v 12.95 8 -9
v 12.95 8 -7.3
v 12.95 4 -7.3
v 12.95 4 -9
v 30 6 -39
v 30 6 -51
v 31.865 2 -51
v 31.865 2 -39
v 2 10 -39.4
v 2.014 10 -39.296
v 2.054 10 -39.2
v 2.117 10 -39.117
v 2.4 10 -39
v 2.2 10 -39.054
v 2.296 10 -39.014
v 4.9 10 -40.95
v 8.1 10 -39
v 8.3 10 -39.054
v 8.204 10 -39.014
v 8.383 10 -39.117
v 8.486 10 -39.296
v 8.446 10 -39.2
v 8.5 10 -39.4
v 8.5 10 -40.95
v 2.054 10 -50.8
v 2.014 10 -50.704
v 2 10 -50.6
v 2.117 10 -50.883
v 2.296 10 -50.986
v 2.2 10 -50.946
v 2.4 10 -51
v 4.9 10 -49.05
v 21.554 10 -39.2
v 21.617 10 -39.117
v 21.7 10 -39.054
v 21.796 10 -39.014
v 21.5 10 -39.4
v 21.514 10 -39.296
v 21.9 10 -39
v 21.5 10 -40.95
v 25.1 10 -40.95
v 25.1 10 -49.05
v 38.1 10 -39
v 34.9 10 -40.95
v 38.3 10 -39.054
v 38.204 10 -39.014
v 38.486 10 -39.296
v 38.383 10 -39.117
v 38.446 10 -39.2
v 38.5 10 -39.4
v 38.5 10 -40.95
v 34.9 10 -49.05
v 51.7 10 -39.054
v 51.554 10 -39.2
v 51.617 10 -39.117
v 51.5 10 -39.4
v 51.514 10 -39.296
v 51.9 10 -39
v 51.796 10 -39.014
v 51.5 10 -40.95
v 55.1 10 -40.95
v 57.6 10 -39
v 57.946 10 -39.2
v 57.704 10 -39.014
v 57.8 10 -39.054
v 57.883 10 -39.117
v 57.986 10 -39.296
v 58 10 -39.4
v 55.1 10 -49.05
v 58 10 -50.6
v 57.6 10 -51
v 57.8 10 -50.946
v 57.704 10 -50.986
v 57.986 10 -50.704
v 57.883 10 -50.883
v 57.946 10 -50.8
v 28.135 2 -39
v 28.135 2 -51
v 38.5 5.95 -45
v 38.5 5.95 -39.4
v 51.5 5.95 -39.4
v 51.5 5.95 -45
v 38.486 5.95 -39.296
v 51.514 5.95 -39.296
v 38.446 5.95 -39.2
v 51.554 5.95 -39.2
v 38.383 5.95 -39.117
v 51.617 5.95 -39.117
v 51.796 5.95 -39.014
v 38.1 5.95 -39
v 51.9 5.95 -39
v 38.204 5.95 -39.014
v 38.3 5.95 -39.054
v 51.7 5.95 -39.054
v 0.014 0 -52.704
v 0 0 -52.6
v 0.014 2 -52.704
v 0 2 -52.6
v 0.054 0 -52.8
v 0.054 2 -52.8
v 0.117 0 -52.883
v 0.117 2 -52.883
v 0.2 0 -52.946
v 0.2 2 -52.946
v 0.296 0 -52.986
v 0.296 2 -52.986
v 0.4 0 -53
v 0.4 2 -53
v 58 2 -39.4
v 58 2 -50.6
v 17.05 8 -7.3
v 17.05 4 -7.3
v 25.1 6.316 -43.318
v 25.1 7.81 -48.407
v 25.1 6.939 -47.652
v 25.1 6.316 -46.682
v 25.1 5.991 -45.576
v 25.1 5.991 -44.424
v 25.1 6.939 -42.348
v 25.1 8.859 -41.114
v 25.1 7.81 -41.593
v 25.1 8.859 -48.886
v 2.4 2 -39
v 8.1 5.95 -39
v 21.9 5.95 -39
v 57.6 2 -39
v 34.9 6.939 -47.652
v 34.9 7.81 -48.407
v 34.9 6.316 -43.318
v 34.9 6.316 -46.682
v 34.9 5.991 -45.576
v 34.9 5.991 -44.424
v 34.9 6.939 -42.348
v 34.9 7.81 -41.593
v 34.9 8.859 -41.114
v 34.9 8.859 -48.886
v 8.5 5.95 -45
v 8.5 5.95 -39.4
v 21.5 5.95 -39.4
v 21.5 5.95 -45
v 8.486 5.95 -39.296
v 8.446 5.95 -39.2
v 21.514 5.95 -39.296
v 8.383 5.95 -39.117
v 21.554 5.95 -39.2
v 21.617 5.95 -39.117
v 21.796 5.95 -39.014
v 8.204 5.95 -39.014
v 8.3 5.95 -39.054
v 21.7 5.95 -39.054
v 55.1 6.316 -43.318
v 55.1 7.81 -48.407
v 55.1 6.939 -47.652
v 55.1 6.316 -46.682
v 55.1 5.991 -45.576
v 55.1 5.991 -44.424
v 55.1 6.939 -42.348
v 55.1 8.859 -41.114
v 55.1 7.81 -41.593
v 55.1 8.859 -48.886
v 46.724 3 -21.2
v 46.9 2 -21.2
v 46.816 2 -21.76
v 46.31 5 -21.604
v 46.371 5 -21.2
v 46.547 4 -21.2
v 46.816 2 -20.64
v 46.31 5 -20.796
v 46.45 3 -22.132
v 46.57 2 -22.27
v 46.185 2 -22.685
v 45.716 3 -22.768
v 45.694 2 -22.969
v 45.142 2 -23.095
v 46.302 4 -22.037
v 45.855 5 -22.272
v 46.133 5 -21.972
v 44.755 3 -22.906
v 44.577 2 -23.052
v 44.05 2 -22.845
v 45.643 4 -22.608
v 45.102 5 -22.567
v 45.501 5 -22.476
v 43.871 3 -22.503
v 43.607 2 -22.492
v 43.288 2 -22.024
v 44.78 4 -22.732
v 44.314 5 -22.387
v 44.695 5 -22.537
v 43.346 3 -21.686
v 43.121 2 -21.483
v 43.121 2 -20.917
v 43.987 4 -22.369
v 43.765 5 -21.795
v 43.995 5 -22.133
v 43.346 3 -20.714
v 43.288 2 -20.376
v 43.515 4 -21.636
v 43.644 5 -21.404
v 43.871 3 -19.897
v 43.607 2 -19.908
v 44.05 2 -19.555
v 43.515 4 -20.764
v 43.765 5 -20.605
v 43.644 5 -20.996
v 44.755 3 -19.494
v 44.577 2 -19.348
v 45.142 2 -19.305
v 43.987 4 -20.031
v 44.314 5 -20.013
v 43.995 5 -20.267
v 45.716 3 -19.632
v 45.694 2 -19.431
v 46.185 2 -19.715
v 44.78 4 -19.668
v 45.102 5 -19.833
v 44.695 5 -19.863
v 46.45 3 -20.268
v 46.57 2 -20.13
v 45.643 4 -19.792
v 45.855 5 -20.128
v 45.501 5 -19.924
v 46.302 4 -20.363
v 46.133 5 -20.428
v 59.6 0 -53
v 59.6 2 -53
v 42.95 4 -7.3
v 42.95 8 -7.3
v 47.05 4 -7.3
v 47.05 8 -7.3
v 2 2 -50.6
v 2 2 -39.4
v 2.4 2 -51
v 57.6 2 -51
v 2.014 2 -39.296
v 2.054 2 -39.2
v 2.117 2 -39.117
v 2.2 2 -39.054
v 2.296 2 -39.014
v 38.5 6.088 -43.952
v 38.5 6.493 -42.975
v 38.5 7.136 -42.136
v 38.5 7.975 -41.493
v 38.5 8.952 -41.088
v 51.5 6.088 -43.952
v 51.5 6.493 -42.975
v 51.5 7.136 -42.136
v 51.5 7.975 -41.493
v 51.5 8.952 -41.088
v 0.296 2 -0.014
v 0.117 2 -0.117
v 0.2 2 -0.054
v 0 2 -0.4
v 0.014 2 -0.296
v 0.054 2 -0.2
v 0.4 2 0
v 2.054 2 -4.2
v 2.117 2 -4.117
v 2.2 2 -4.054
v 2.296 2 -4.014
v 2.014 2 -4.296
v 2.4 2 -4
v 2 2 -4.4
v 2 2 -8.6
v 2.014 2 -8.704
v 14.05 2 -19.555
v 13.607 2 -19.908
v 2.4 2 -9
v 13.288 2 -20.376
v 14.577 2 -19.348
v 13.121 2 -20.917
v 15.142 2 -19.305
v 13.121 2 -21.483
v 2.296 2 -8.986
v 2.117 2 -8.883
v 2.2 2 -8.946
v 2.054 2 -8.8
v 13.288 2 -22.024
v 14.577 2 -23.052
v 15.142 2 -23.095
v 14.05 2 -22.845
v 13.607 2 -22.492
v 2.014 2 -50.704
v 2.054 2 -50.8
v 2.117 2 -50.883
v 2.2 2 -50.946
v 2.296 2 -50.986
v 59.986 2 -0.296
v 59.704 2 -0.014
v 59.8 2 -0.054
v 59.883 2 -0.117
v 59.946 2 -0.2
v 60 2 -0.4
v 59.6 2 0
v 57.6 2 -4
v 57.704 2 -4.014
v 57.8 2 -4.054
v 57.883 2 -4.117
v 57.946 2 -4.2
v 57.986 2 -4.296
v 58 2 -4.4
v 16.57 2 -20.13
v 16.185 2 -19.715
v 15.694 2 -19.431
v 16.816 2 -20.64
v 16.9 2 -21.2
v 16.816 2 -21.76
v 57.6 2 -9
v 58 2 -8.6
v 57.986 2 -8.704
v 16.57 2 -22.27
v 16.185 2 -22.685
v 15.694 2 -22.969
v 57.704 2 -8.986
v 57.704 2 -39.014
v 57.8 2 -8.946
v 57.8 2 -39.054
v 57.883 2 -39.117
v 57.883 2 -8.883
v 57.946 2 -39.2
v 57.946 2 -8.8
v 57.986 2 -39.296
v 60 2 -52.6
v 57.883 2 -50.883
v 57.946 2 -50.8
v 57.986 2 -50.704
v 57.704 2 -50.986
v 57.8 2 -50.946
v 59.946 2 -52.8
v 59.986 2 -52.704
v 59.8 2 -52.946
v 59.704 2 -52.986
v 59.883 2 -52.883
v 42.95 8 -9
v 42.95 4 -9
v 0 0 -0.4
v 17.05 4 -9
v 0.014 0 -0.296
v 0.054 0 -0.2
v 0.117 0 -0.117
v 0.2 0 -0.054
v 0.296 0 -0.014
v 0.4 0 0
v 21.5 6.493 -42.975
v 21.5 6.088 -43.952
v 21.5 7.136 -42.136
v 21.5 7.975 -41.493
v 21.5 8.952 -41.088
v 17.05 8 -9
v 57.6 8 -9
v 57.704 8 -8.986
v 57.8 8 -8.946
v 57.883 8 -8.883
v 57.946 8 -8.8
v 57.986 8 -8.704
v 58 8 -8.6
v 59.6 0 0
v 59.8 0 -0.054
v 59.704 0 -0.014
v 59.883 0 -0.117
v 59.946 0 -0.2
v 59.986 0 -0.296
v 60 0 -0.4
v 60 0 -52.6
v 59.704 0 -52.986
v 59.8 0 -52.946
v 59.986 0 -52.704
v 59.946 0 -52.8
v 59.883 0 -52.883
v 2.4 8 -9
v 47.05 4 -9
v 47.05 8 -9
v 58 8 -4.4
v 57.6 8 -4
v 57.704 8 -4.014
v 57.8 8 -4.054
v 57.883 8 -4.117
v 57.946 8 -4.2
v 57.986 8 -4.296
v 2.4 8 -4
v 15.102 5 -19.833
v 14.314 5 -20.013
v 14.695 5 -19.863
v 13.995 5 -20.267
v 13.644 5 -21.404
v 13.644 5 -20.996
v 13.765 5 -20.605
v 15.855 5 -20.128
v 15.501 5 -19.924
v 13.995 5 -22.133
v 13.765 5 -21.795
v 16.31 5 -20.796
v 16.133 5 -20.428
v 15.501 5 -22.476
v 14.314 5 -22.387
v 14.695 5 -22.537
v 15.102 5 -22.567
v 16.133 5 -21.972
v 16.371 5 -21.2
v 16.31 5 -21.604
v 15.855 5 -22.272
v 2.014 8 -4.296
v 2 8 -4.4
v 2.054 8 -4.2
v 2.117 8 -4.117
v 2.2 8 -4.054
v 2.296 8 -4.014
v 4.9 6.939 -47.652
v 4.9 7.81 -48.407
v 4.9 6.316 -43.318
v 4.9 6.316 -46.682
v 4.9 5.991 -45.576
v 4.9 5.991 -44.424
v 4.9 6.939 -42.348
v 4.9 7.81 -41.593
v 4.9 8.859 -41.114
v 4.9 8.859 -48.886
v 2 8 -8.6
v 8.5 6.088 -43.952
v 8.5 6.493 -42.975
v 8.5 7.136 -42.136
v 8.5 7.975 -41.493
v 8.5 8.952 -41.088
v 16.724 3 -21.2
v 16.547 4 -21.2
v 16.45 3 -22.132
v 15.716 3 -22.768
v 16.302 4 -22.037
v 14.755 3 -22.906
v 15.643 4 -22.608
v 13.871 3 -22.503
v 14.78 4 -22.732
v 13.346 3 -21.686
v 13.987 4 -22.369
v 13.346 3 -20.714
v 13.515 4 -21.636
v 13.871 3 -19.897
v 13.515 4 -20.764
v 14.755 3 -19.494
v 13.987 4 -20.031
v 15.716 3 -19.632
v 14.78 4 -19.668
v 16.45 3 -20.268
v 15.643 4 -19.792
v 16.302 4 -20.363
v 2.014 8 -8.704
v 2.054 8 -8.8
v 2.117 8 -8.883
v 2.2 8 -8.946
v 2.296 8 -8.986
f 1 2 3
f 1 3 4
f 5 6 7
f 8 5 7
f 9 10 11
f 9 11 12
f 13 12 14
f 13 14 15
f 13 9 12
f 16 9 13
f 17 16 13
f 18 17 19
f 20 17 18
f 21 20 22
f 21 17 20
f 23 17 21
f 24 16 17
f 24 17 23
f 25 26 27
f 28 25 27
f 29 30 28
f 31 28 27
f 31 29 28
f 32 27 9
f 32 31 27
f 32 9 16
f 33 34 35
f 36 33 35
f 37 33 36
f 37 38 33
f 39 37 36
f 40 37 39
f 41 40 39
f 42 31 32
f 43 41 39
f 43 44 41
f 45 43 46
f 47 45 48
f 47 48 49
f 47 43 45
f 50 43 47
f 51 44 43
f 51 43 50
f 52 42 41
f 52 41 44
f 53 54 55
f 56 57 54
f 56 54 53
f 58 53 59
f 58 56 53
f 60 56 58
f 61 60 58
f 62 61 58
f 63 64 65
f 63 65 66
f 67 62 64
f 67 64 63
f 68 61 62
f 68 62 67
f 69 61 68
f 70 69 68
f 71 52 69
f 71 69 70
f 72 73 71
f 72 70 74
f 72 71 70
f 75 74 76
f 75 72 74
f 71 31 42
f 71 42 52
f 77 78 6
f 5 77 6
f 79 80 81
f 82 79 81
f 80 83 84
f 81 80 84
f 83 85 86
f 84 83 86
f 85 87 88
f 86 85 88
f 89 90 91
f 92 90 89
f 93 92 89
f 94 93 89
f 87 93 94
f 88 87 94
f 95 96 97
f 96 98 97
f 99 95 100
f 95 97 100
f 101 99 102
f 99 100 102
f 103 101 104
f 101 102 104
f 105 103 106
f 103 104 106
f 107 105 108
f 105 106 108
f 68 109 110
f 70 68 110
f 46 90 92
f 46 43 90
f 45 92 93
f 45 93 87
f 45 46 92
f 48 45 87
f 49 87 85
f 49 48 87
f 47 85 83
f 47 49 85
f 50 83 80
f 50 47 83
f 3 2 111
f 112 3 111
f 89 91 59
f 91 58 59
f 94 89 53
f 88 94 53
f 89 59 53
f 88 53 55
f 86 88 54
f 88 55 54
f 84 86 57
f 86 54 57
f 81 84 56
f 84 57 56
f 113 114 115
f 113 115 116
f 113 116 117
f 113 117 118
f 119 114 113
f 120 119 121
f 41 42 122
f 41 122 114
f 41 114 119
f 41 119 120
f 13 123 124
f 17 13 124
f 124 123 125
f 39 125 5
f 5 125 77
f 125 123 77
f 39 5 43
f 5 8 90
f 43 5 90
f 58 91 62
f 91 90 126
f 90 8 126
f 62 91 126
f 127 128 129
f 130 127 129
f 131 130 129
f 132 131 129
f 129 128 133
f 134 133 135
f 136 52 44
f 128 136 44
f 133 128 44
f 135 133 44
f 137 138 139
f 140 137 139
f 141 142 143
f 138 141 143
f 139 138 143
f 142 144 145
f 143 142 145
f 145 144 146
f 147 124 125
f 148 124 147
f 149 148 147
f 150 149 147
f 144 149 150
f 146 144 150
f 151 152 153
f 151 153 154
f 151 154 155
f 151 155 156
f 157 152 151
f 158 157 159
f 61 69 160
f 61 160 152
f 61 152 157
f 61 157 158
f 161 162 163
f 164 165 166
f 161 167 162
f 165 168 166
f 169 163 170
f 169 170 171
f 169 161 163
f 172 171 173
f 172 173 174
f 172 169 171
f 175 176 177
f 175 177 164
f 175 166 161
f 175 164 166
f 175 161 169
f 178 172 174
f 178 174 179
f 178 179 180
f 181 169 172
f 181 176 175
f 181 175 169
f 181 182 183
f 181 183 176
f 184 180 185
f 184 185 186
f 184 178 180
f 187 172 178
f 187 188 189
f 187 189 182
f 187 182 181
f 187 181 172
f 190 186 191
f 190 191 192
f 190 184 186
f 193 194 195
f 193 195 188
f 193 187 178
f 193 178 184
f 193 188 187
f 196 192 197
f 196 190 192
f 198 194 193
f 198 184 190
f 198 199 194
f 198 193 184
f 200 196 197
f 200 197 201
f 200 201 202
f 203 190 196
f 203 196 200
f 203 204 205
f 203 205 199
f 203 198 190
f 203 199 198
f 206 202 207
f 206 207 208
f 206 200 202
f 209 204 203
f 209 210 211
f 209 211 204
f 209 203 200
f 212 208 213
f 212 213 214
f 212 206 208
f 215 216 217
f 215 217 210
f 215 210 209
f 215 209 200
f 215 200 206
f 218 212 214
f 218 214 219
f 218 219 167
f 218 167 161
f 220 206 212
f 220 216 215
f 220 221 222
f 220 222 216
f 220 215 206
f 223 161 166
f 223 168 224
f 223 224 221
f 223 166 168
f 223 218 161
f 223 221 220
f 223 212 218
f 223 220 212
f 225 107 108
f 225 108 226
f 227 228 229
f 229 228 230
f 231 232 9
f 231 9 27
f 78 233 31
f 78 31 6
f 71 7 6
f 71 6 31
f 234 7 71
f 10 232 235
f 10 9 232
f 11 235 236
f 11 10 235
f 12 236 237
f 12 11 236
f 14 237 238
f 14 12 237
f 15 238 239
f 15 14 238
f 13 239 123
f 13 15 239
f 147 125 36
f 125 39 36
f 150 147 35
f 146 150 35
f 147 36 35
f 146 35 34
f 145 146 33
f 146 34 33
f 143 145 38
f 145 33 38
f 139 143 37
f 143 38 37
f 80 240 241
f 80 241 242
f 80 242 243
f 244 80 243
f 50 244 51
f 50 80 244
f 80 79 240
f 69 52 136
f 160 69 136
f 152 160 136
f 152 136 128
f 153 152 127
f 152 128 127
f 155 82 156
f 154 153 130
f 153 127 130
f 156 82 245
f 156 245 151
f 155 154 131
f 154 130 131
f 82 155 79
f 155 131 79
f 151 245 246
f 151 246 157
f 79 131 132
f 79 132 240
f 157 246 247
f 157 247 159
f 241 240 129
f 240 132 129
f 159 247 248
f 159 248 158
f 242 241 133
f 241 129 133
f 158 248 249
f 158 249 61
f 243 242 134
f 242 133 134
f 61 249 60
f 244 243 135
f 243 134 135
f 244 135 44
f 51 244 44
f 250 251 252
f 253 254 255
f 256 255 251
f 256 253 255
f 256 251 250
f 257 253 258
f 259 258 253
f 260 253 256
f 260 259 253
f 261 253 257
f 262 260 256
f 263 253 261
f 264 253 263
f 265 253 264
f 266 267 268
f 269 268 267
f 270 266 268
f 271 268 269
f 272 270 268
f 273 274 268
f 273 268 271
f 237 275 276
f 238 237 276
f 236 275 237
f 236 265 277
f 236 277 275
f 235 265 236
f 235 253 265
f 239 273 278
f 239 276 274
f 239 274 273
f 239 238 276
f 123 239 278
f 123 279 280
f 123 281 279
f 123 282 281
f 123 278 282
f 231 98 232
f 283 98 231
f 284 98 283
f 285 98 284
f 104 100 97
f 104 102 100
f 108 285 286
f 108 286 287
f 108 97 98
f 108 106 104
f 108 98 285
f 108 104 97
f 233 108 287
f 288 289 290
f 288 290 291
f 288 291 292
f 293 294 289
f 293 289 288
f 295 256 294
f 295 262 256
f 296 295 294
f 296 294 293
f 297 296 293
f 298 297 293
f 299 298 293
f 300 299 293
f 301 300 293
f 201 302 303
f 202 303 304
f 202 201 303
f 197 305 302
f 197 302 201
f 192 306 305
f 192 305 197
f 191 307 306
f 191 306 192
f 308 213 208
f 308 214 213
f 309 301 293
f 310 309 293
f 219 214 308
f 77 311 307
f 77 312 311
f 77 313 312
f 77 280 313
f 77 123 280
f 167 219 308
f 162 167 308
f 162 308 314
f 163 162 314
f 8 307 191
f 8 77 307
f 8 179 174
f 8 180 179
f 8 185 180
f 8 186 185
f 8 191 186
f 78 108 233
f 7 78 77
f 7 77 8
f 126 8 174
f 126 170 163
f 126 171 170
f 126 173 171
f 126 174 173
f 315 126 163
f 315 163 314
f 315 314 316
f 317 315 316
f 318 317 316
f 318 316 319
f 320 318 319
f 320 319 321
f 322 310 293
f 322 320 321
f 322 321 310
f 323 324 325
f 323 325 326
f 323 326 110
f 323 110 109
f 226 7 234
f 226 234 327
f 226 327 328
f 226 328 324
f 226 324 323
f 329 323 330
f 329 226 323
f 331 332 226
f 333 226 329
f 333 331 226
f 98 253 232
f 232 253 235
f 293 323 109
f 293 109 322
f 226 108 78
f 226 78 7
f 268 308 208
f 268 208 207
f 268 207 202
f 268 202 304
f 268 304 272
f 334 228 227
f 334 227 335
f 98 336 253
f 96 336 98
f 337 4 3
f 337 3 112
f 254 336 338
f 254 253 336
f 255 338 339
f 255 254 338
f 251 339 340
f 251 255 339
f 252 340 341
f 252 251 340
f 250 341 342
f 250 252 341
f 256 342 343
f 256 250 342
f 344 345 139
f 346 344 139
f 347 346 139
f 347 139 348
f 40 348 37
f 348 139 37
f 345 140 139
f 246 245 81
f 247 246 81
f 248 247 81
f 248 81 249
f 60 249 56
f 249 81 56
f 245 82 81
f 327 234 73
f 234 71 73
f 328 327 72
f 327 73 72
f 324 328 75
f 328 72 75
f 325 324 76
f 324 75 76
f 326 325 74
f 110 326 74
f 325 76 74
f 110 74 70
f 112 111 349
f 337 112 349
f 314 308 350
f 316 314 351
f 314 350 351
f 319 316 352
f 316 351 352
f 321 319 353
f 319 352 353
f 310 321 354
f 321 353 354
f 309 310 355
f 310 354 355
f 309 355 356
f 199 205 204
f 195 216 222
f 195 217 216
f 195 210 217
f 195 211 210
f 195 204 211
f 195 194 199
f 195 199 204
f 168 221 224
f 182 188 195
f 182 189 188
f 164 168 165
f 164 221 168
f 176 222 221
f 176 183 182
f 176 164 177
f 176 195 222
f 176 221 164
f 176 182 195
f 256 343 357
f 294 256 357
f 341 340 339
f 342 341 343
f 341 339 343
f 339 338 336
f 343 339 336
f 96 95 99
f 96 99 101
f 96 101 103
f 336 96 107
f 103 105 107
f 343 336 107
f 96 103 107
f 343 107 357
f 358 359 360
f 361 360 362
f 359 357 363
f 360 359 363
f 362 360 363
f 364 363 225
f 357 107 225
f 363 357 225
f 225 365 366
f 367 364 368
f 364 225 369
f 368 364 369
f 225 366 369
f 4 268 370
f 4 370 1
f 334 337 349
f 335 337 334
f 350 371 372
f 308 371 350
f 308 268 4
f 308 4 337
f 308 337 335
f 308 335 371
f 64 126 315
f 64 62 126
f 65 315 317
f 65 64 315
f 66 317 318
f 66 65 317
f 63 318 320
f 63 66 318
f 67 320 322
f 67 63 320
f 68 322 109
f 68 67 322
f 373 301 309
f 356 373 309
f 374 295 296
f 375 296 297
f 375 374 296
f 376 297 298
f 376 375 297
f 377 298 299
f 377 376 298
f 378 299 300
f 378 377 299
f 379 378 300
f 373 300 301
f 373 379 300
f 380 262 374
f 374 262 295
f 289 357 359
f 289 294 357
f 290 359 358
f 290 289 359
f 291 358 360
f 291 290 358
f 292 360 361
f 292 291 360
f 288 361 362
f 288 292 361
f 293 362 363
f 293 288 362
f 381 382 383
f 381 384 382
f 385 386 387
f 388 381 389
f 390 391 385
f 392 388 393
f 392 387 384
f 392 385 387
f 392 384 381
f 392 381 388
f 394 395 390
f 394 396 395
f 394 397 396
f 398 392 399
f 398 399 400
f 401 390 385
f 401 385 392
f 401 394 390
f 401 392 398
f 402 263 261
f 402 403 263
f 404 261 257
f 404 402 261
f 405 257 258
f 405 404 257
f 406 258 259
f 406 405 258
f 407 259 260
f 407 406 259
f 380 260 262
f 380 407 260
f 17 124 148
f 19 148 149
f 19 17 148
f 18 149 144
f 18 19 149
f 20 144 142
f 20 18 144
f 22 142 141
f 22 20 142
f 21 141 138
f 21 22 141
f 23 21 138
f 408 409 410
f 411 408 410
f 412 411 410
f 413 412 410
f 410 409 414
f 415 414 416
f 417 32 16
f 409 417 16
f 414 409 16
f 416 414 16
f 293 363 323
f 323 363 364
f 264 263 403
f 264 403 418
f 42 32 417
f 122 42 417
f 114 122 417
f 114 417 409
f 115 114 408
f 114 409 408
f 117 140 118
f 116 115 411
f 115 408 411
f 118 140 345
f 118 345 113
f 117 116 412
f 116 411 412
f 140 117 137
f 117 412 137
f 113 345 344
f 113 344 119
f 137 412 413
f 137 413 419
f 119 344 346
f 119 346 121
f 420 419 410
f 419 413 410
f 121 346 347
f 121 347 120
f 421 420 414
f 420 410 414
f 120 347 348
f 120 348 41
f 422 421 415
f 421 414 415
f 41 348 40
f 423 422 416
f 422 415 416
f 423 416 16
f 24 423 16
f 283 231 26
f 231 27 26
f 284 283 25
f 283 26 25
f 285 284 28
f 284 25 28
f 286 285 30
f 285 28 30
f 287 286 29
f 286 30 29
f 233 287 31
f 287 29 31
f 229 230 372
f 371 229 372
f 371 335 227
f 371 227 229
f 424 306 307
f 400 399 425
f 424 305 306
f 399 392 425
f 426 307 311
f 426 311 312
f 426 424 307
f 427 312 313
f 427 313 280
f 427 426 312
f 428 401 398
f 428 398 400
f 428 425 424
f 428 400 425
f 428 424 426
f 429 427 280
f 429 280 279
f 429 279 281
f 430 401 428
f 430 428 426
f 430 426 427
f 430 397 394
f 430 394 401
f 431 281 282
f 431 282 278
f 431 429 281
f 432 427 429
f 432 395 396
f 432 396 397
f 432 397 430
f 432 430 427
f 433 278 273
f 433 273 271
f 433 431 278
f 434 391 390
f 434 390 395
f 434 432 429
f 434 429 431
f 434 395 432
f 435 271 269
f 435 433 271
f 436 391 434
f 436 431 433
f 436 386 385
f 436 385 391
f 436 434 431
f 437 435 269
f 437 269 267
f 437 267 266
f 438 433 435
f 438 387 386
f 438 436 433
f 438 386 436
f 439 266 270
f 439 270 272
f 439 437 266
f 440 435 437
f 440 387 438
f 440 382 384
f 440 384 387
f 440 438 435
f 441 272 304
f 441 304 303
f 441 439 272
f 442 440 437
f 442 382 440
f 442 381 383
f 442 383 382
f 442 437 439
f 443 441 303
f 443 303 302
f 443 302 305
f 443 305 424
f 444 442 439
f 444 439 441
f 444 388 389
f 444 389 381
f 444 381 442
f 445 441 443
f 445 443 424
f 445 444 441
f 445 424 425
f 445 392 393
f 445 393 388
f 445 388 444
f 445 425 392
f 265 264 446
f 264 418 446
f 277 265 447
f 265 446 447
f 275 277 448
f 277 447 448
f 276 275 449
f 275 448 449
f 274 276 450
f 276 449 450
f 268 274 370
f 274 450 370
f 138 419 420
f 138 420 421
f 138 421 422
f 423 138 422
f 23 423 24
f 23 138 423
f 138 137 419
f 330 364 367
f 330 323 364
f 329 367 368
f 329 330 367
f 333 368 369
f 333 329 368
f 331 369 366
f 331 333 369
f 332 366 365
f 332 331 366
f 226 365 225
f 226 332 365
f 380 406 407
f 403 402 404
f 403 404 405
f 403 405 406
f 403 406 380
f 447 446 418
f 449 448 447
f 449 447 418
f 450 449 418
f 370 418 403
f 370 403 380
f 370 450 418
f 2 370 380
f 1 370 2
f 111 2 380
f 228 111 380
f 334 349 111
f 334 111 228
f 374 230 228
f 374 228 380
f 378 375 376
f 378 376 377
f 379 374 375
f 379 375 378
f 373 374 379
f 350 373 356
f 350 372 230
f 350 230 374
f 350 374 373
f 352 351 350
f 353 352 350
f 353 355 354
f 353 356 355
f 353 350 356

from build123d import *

# Parameters (mm, degrees)
SKETCH1_W               = 60
SKETCH1_H               = 53
BOSS_EXTRUDE1_DEPTH     = 2
SKETCH3_W               = 56
SKETCH3_H               = 12
BOSS_EXTRUDE3_DEPTH     = 10
SKETCH2_W               = 56
SKETCH2_H               = 5
BOSS_EXTRUDE2_DEPTH     = 8
CUT_EXTRUDE1_DEPTH      = 10.1
CUT_EXTRUDE1_DEPTH_BACK = 10.1
CUT_EXTRUDE2_DEPTH      = 10.1
CUT_EXTRUDE2_DEPTH_BACK = 10.1
SKETCH6_W               = 13
SKETCH6_H               = 4.05
CUT_EXTRUDE3_DEPTH      = 6
SKETCH7_R               = 1.9
BOSS_EXTRUDE4_DEPTH     = 3
BOSS_EXTRUDE4_TAPER     = 10
FILLET2_R               = 0.4
CUT_EXTRUDE4_REACH      = 53
SKETCH9_W               = 4.1
SKETCH9_H               = 1.7
CUT_EXTRUDE5_DEPTH      = 4


with BuildPart() as part:
    # Sketch1 → Boss-Extrude1 (new body)
    with BuildSketch(Plane(origin=(0, 0, 0), x_dir=(1, 0, 0), z_dir=(0, 1, 0))):
        with Locations((30, 26.5)):
            Rectangle(SKETCH1_W, SKETCH1_H)
    extrude(amount=BOSS_EXTRUDE1_DEPTH)

    # Sketch3 → Boss-Extrude3 (add)
    with BuildSketch(Plane(origin=(0, 0, 0), x_dir=(1, 0, 0), z_dir=(0, 1, 0))):
        with Locations((30, 45)):
            Rectangle(SKETCH3_W, SKETCH3_H)
    extrude(amount=BOSS_EXTRUDE3_DEPTH)

    # Sketch2 → Boss-Extrude2 (add)
    with BuildSketch(Plane(origin=(0, 0, 0), x_dir=(1, 0, 0), z_dir=(0, 1, 0))):
        with Locations((30, 6.5)):
            Rectangle(SKETCH2_W, SKETCH2_H)
    extrude(amount=BOSS_EXTRUDE2_DEPTH)

    # Sketch4 → Cut-Extrude1 (cut, two sides)
    with BuildSketch(Plane.ZY.offset(-15)) as cut_extrude1_sk:
        with BuildLine():
            Line((-40.95, 10), (-49.05, 10))
            ThreePointArc((-49.05, 10), (-45, 5.95), (-40.95, 10))
        make_face()
    extrude(amount=CUT_EXTRUDE1_DEPTH, mode=Mode.SUBTRACT)
    extrude(cut_extrude1_sk.sketch, amount=-CUT_EXTRUDE1_DEPTH_BACK, mode=Mode.SUBTRACT)

    # Sketch5 → Cut-Extrude2 (cut, two sides)
    with BuildSketch(Plane(origin=(45, 0, 0), x_dir=(0, 0, -1), z_dir=(1, 0, 0))) as cut_extrude2_sk:
        with BuildLine():
            Line((40.95, 10), (49.05, 10))
            ThreePointArc((49.05, 10), (45, 5.95), (40.95, 10))
        make_face()
    extrude(amount=CUT_EXTRUDE2_DEPTH, mode=Mode.SUBTRACT)
    extrude(cut_extrude2_sk.sketch, amount=-CUT_EXTRUDE2_DEPTH_BACK, mode=Mode.SUBTRACT)

    # Sketch6 → Cut-Extrude3 (cut)
    with BuildSketch(Plane.XY.offset(-39)):
        with Locations((15, 7.975)):
            Rectangle(SKETCH6_W, SKETCH6_H)
        with Locations((45, 7.975)):
            Rectangle(SKETCH6_W, SKETCH6_H)
    extrude(amount=-CUT_EXTRUDE3_DEPTH, mode=Mode.SUBTRACT)

    # Sketch7 → Boss-Extrude4 (add)
    with BuildSketch(Plane(origin=(0, 2, 0), x_dir=(1, 0, 0), z_dir=(0, 1, 0))):
        with Locations((15, 21.2)):
            Circle(SKETCH7_R)
        with Locations((45, 21.2)):
            Circle(SKETCH7_R)
    extrude(amount=BOSS_EXTRUDE4_DEPTH, taper=BOSS_EXTRUDE4_TAPER)

    # Fillet2
    fillet2_edges = [part.edges().sort_by_distance(p)[0] for p in [
        (58, 6, -51),
        (2, 6, -51),
        (2, 6, -39),
        (58, 6, -39),
        (2, 5, -4),
        (58, 5, -4),
        (58, 5, -9),
        (2, 5, -9),
        (0, 1, 0),
        (0, 1, -53),
        (60, 1, -53),
        (60, 1, 0),
        (8.5, 7.975, -39),
        (21.5, 7.975, -39),
        (38.5, 7.975, -39),
        (51.5, 7.975, -39),
    ]]
    fillet(fillet2_edges, radius=FILLET2_R)

    # Sketch8 → Cut-Extrude4 (cut, up to next)
    with BuildSketch(Plane(origin=(0, 0, -51), x_dir=(-1, 0, 0), z_dir=(0, 0, -1)), mode=Mode.PRIVATE) as cut_extrude4_sk1:
        Polygon((-30, 6), (-31.865230633, 2), (-28.134769367, 2), align=None)
    cut_extrude4_tool1 = extrude(cut_extrude4_sk1.sketch, amount=-CUT_EXTRUDE4_REACH, mode=Mode.PRIVATE) & part.part
    add(cut_extrude4_tool1.solids().sort_by_distance((30, 3.333333, -51))[0], mode=Mode.SUBTRACT)

    # Sketch9 → Cut-Extrude5 (cut)
    with BuildSketch(Plane(origin=(0, 8, 0), x_dir=(1, 0, 0), z_dir=(0, 1, 0))):
        with Locations((15, 8.15)):
            Rectangle(SKETCH9_W, SKETCH9_H)
        with Locations((45, 8.15)):
            Rectangle(SKETCH9_W, SKETCH9_H)
    extrude(amount=-CUT_EXTRUDE5_DEPTH, mode=Mode.SUBTRACT)


solid = part.part
